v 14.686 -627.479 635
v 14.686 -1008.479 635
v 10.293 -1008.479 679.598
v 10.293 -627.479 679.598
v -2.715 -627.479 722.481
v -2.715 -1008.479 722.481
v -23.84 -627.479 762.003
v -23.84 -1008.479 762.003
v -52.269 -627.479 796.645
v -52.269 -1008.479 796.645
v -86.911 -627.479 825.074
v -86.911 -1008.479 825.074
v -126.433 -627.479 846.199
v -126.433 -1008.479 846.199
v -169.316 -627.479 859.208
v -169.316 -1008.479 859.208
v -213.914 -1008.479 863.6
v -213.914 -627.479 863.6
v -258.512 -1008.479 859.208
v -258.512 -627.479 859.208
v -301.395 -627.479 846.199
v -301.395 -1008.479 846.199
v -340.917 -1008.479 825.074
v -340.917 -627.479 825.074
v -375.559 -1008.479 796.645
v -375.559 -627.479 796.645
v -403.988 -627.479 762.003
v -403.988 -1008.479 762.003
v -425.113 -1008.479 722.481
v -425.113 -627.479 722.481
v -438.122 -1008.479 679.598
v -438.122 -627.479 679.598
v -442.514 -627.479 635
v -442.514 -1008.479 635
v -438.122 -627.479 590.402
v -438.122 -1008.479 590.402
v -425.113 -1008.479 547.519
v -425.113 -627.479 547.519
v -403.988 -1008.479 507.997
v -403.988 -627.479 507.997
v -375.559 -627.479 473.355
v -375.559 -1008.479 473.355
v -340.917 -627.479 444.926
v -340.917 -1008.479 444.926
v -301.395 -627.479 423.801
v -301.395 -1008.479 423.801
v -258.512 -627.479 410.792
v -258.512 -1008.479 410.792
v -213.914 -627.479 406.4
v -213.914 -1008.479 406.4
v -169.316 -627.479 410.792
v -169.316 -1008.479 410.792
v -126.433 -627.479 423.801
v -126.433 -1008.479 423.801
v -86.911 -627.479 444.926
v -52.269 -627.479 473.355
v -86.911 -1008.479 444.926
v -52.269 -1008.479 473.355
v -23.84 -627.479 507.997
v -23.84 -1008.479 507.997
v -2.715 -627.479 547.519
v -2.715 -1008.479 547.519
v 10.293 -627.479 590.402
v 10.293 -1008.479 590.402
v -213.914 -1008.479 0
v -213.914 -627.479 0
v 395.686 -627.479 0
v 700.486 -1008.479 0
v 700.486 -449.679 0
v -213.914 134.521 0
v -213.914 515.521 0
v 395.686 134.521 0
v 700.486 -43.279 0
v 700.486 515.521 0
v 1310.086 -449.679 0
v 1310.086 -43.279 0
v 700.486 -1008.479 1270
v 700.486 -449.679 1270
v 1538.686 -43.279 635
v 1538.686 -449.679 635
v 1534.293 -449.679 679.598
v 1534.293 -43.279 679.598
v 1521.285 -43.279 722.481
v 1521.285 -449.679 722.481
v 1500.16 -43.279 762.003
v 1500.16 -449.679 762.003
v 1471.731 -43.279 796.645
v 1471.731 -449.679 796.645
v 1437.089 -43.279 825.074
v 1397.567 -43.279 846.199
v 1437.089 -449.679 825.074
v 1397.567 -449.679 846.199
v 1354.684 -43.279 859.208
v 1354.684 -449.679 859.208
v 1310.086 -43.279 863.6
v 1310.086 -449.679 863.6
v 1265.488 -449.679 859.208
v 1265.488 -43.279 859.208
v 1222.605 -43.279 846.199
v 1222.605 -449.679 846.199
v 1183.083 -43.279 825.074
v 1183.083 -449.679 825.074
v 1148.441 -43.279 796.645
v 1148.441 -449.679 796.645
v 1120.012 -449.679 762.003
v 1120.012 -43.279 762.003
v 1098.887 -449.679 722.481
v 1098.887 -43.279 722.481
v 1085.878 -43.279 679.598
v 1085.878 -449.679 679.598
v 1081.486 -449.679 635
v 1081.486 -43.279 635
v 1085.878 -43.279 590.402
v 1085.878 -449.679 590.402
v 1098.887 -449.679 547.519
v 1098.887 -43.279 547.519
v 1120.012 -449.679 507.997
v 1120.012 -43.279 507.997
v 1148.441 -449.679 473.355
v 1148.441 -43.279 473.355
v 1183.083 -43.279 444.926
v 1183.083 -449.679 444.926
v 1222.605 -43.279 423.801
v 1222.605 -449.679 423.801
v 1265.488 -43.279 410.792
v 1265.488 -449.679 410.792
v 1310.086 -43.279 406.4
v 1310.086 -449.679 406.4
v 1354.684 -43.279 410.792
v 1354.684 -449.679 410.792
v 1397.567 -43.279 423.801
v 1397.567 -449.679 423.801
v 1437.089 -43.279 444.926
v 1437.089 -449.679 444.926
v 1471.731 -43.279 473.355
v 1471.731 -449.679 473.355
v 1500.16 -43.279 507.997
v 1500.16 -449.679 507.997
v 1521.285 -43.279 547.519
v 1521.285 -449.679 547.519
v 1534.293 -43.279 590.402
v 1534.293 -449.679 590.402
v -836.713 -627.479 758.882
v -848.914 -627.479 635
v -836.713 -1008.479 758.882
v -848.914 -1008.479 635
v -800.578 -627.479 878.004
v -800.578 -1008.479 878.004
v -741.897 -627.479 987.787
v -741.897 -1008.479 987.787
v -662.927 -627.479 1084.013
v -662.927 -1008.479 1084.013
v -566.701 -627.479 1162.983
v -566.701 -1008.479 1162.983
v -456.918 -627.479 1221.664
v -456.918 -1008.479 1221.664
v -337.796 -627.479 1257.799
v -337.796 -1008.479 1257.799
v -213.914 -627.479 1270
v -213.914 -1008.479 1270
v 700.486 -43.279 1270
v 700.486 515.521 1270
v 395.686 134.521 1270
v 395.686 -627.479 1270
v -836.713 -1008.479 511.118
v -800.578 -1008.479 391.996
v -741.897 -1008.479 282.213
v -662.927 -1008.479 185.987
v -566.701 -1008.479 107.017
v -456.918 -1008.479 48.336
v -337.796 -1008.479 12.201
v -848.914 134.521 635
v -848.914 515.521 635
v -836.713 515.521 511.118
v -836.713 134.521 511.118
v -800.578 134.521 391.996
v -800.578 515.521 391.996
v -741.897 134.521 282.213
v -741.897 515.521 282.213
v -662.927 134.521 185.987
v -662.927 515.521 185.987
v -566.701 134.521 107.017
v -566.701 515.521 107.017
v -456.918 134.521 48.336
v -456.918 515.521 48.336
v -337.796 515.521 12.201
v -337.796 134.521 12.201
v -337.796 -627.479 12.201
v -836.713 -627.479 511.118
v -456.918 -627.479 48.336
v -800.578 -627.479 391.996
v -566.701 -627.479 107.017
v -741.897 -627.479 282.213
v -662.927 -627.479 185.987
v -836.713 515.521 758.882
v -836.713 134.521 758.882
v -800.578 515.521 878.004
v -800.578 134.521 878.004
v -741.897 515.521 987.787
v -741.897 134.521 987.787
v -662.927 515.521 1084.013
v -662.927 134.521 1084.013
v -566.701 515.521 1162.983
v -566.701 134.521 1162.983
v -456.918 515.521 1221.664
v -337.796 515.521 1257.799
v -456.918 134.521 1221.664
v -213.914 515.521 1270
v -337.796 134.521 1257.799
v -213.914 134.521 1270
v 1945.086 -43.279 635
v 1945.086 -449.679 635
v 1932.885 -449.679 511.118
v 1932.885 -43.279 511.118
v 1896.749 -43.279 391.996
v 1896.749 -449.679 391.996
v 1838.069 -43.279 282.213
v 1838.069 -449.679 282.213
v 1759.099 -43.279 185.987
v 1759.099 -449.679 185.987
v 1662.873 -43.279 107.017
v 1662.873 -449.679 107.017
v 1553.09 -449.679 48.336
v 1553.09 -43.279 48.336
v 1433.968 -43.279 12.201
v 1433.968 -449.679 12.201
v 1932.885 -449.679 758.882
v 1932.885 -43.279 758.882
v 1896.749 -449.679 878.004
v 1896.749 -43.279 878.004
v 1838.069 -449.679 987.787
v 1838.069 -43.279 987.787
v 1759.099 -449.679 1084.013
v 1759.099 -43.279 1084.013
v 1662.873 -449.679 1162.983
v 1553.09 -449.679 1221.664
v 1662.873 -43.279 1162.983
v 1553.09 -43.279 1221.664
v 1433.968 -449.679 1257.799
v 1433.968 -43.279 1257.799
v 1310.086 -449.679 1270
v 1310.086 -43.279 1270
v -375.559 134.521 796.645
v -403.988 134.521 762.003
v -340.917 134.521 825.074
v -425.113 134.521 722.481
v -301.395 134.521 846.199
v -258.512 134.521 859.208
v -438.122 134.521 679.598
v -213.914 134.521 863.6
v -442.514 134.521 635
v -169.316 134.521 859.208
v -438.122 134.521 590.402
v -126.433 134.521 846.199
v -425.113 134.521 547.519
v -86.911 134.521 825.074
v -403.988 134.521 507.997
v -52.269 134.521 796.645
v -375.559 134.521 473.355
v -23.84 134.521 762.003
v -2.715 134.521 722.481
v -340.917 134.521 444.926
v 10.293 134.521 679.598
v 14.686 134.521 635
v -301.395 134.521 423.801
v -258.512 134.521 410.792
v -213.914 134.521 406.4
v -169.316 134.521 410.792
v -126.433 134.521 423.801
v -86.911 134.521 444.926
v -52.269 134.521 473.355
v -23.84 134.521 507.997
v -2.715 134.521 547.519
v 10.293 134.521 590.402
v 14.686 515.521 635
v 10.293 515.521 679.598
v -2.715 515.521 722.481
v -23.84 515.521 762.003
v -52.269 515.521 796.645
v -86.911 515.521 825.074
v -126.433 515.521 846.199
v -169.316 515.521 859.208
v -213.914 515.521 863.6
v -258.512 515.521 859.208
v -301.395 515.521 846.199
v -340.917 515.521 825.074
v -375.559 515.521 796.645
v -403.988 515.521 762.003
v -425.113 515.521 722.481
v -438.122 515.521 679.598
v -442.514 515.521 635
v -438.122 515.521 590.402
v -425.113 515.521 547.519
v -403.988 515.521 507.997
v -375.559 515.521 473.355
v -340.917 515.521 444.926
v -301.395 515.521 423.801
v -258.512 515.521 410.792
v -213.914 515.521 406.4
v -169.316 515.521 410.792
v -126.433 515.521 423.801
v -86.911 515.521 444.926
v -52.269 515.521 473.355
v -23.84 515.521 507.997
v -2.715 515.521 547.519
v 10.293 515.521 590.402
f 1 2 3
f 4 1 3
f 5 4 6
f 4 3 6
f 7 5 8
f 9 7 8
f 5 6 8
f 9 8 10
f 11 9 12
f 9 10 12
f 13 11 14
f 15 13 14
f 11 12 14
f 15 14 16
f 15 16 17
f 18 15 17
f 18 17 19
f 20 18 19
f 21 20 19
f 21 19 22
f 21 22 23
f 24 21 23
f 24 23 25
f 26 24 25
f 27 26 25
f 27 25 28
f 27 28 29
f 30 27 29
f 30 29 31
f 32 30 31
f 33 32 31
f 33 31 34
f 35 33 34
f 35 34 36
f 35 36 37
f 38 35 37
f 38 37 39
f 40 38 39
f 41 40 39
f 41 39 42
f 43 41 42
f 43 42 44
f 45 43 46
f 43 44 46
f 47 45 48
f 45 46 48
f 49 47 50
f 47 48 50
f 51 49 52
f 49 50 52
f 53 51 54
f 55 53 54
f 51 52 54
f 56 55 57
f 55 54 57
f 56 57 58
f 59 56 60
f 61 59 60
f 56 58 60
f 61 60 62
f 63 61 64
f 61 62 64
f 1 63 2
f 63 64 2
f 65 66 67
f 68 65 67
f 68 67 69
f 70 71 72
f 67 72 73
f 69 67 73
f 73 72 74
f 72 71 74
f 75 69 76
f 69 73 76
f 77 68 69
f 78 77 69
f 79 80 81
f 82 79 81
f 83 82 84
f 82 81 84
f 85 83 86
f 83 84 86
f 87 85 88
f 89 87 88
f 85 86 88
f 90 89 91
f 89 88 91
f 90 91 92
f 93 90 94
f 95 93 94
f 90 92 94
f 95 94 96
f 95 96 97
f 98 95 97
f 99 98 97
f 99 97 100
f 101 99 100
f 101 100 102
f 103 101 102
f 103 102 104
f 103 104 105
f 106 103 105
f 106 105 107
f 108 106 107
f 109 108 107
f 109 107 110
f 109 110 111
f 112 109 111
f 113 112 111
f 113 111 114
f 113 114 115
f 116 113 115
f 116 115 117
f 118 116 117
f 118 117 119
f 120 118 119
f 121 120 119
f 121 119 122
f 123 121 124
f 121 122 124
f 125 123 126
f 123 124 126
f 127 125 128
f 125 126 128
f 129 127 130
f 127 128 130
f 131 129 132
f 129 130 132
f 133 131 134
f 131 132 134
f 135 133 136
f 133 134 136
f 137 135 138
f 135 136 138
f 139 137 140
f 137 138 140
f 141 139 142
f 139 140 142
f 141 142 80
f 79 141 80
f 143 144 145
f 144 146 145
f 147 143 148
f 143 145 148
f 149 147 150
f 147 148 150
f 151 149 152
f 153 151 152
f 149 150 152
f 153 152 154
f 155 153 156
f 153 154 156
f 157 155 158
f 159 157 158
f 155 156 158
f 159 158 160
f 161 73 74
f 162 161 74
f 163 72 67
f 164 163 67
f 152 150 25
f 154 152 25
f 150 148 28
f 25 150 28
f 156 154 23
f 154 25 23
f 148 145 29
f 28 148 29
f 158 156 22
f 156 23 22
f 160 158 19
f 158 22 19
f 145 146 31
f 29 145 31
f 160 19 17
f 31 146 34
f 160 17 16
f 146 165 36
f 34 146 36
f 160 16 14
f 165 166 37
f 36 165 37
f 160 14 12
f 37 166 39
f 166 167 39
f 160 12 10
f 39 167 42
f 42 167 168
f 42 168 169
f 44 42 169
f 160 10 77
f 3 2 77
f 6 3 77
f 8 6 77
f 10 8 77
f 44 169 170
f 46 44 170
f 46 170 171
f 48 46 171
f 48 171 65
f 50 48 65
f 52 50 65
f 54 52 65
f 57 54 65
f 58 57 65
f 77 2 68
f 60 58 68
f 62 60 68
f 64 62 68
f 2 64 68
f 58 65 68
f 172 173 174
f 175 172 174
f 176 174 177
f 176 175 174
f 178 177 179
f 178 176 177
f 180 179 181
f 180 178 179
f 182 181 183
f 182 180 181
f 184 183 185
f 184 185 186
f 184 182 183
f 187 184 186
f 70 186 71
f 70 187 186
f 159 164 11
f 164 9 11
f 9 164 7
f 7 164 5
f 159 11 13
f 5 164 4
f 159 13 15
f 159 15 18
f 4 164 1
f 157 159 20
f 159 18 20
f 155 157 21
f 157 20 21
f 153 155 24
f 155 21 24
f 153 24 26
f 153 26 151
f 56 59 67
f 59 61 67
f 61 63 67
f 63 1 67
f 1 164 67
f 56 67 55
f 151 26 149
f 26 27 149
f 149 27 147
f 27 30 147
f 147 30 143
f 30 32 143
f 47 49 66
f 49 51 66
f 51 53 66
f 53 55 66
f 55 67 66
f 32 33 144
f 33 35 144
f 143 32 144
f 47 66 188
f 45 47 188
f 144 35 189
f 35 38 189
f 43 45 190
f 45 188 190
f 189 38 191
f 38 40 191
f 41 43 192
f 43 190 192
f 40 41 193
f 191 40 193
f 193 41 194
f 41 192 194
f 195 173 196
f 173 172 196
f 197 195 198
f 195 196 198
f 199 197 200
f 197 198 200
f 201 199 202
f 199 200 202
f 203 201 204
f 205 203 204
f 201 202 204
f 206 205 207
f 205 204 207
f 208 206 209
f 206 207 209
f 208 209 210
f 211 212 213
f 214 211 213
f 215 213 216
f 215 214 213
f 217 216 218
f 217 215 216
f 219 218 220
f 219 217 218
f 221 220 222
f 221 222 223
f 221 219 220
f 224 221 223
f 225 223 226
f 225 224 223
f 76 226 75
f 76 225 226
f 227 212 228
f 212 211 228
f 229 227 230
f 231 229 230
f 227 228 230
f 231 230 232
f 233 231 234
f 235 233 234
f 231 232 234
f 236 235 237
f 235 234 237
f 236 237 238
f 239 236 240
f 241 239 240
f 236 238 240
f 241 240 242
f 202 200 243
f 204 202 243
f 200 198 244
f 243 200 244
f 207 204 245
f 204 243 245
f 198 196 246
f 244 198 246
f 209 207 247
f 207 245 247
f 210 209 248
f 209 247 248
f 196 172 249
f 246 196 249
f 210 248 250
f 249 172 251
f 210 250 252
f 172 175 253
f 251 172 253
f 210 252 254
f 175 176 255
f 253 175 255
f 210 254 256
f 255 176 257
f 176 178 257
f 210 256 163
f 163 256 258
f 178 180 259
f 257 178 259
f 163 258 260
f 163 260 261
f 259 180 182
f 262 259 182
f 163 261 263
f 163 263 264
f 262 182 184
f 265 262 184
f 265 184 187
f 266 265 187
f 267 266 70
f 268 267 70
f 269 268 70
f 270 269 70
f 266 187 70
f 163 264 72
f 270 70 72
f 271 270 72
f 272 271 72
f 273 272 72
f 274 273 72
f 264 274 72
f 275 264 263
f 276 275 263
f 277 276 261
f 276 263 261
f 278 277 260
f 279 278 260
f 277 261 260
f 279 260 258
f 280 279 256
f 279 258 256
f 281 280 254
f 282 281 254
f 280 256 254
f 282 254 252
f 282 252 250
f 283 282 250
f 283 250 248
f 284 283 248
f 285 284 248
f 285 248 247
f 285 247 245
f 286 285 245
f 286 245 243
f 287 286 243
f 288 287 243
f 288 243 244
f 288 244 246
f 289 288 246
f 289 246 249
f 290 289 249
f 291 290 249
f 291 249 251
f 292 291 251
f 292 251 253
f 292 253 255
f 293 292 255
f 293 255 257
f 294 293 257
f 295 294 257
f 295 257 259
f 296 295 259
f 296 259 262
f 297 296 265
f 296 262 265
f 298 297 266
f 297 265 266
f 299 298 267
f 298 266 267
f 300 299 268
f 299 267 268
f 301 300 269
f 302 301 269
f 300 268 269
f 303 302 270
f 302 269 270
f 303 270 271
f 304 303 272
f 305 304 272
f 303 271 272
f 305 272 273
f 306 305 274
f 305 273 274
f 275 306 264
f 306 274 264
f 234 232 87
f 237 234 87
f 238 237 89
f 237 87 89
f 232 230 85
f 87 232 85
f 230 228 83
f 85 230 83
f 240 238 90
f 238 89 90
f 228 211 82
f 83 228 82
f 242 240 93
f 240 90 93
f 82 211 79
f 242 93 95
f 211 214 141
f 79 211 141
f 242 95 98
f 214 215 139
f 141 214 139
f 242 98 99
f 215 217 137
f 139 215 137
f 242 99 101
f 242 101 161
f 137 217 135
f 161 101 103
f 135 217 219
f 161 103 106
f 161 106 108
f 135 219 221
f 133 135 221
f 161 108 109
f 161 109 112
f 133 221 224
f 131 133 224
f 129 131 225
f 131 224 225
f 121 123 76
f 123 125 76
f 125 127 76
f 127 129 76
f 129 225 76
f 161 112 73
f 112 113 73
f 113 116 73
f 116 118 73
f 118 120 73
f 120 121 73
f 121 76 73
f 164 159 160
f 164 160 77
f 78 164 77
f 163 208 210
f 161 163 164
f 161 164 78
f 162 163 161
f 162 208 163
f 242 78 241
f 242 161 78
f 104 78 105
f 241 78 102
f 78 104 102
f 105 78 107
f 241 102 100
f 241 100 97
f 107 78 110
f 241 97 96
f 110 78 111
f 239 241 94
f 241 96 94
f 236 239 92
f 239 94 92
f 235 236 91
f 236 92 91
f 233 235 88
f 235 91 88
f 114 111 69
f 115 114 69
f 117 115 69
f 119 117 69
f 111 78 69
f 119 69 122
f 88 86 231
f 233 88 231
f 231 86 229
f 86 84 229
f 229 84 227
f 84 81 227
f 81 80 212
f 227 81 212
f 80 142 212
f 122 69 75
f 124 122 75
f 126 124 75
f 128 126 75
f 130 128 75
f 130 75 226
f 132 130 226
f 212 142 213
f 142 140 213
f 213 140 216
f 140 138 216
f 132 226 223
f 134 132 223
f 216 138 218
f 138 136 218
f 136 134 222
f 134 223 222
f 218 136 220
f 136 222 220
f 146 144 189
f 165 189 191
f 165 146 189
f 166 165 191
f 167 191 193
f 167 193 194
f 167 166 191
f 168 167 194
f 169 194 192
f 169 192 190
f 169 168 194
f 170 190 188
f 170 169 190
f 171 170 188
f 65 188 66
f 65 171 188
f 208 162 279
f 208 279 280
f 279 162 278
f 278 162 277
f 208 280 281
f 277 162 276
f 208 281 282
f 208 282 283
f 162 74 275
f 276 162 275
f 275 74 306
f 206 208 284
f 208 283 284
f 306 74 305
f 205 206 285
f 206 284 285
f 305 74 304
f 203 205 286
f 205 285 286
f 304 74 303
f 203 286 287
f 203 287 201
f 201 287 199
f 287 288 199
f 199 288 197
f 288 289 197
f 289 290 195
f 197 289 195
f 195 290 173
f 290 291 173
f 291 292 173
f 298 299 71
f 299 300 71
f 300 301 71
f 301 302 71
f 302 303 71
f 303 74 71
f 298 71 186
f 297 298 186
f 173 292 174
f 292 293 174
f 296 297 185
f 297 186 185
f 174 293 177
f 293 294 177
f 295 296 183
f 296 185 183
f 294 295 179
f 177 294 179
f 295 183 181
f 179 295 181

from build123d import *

# Parameters (mm, degrees)
F1_DEPTH = 1270
F2_R     = 634.99999
F3_R     = 228.6
F4_DEPTH = 2540


# Not quite as in the source:
# - a fillet or chamfer is up to 0.001 mm smaller than in the source, because OpenCascade refuses the exact size


with BuildPart() as f1:
    # F0 (on Top) → F1 (new body)
    with BuildSketch(Plane.XY):
        Polygon((700.4859354367, 515.521452381), (-848.9140645633, 515.521452381), (-848.9140645633, 134.521452381), (395.6859354367, 134.521452381), (395.6859354367, -627.478547619), (-848.9140645633, -627.478547619), (-848.9140645633, -1008.478547619), (700.4859354367, -1008.478547619), (700.4859354367, -449.678547619), (1945.0859354367, -449.678547619), (1945.0859354367, -43.278547619), (700.4859354367, -43.278547619), align=None)
    extrude(amount=F1_DEPTH)

    # F2 (radius 635 in the source; OpenCascade refuses exactly that, so slightly less here)
    f2_edges = [f1.edges().sort_by_distance(p)[0] for p in [
        (1945.085935, -246.478548, 1270),
        (1945.085935, -246.478548, 0),
        (-848.914065, -817.978548, 1270),
        (-848.914065, -817.978548, 0),
        (-848.914065, 325.021452, 0),
        (-848.914065, 325.021452, 1270),
    ]]
    fillet(f2_edges, radius=F2_R)

    # F3 (on face) → F4 (cut)
    with BuildSketch(Plane.XZ.offset(1008.478547619)):
        with Locations((-213.9140645633, 635)):
            Circle(F3_R)
        with Locations((1310.0859354367, 635)):
            Circle(F3_R)
    extrude(amount=-F4_DEPTH, mode=Mode.SUBTRACT)


solid = f1.part
